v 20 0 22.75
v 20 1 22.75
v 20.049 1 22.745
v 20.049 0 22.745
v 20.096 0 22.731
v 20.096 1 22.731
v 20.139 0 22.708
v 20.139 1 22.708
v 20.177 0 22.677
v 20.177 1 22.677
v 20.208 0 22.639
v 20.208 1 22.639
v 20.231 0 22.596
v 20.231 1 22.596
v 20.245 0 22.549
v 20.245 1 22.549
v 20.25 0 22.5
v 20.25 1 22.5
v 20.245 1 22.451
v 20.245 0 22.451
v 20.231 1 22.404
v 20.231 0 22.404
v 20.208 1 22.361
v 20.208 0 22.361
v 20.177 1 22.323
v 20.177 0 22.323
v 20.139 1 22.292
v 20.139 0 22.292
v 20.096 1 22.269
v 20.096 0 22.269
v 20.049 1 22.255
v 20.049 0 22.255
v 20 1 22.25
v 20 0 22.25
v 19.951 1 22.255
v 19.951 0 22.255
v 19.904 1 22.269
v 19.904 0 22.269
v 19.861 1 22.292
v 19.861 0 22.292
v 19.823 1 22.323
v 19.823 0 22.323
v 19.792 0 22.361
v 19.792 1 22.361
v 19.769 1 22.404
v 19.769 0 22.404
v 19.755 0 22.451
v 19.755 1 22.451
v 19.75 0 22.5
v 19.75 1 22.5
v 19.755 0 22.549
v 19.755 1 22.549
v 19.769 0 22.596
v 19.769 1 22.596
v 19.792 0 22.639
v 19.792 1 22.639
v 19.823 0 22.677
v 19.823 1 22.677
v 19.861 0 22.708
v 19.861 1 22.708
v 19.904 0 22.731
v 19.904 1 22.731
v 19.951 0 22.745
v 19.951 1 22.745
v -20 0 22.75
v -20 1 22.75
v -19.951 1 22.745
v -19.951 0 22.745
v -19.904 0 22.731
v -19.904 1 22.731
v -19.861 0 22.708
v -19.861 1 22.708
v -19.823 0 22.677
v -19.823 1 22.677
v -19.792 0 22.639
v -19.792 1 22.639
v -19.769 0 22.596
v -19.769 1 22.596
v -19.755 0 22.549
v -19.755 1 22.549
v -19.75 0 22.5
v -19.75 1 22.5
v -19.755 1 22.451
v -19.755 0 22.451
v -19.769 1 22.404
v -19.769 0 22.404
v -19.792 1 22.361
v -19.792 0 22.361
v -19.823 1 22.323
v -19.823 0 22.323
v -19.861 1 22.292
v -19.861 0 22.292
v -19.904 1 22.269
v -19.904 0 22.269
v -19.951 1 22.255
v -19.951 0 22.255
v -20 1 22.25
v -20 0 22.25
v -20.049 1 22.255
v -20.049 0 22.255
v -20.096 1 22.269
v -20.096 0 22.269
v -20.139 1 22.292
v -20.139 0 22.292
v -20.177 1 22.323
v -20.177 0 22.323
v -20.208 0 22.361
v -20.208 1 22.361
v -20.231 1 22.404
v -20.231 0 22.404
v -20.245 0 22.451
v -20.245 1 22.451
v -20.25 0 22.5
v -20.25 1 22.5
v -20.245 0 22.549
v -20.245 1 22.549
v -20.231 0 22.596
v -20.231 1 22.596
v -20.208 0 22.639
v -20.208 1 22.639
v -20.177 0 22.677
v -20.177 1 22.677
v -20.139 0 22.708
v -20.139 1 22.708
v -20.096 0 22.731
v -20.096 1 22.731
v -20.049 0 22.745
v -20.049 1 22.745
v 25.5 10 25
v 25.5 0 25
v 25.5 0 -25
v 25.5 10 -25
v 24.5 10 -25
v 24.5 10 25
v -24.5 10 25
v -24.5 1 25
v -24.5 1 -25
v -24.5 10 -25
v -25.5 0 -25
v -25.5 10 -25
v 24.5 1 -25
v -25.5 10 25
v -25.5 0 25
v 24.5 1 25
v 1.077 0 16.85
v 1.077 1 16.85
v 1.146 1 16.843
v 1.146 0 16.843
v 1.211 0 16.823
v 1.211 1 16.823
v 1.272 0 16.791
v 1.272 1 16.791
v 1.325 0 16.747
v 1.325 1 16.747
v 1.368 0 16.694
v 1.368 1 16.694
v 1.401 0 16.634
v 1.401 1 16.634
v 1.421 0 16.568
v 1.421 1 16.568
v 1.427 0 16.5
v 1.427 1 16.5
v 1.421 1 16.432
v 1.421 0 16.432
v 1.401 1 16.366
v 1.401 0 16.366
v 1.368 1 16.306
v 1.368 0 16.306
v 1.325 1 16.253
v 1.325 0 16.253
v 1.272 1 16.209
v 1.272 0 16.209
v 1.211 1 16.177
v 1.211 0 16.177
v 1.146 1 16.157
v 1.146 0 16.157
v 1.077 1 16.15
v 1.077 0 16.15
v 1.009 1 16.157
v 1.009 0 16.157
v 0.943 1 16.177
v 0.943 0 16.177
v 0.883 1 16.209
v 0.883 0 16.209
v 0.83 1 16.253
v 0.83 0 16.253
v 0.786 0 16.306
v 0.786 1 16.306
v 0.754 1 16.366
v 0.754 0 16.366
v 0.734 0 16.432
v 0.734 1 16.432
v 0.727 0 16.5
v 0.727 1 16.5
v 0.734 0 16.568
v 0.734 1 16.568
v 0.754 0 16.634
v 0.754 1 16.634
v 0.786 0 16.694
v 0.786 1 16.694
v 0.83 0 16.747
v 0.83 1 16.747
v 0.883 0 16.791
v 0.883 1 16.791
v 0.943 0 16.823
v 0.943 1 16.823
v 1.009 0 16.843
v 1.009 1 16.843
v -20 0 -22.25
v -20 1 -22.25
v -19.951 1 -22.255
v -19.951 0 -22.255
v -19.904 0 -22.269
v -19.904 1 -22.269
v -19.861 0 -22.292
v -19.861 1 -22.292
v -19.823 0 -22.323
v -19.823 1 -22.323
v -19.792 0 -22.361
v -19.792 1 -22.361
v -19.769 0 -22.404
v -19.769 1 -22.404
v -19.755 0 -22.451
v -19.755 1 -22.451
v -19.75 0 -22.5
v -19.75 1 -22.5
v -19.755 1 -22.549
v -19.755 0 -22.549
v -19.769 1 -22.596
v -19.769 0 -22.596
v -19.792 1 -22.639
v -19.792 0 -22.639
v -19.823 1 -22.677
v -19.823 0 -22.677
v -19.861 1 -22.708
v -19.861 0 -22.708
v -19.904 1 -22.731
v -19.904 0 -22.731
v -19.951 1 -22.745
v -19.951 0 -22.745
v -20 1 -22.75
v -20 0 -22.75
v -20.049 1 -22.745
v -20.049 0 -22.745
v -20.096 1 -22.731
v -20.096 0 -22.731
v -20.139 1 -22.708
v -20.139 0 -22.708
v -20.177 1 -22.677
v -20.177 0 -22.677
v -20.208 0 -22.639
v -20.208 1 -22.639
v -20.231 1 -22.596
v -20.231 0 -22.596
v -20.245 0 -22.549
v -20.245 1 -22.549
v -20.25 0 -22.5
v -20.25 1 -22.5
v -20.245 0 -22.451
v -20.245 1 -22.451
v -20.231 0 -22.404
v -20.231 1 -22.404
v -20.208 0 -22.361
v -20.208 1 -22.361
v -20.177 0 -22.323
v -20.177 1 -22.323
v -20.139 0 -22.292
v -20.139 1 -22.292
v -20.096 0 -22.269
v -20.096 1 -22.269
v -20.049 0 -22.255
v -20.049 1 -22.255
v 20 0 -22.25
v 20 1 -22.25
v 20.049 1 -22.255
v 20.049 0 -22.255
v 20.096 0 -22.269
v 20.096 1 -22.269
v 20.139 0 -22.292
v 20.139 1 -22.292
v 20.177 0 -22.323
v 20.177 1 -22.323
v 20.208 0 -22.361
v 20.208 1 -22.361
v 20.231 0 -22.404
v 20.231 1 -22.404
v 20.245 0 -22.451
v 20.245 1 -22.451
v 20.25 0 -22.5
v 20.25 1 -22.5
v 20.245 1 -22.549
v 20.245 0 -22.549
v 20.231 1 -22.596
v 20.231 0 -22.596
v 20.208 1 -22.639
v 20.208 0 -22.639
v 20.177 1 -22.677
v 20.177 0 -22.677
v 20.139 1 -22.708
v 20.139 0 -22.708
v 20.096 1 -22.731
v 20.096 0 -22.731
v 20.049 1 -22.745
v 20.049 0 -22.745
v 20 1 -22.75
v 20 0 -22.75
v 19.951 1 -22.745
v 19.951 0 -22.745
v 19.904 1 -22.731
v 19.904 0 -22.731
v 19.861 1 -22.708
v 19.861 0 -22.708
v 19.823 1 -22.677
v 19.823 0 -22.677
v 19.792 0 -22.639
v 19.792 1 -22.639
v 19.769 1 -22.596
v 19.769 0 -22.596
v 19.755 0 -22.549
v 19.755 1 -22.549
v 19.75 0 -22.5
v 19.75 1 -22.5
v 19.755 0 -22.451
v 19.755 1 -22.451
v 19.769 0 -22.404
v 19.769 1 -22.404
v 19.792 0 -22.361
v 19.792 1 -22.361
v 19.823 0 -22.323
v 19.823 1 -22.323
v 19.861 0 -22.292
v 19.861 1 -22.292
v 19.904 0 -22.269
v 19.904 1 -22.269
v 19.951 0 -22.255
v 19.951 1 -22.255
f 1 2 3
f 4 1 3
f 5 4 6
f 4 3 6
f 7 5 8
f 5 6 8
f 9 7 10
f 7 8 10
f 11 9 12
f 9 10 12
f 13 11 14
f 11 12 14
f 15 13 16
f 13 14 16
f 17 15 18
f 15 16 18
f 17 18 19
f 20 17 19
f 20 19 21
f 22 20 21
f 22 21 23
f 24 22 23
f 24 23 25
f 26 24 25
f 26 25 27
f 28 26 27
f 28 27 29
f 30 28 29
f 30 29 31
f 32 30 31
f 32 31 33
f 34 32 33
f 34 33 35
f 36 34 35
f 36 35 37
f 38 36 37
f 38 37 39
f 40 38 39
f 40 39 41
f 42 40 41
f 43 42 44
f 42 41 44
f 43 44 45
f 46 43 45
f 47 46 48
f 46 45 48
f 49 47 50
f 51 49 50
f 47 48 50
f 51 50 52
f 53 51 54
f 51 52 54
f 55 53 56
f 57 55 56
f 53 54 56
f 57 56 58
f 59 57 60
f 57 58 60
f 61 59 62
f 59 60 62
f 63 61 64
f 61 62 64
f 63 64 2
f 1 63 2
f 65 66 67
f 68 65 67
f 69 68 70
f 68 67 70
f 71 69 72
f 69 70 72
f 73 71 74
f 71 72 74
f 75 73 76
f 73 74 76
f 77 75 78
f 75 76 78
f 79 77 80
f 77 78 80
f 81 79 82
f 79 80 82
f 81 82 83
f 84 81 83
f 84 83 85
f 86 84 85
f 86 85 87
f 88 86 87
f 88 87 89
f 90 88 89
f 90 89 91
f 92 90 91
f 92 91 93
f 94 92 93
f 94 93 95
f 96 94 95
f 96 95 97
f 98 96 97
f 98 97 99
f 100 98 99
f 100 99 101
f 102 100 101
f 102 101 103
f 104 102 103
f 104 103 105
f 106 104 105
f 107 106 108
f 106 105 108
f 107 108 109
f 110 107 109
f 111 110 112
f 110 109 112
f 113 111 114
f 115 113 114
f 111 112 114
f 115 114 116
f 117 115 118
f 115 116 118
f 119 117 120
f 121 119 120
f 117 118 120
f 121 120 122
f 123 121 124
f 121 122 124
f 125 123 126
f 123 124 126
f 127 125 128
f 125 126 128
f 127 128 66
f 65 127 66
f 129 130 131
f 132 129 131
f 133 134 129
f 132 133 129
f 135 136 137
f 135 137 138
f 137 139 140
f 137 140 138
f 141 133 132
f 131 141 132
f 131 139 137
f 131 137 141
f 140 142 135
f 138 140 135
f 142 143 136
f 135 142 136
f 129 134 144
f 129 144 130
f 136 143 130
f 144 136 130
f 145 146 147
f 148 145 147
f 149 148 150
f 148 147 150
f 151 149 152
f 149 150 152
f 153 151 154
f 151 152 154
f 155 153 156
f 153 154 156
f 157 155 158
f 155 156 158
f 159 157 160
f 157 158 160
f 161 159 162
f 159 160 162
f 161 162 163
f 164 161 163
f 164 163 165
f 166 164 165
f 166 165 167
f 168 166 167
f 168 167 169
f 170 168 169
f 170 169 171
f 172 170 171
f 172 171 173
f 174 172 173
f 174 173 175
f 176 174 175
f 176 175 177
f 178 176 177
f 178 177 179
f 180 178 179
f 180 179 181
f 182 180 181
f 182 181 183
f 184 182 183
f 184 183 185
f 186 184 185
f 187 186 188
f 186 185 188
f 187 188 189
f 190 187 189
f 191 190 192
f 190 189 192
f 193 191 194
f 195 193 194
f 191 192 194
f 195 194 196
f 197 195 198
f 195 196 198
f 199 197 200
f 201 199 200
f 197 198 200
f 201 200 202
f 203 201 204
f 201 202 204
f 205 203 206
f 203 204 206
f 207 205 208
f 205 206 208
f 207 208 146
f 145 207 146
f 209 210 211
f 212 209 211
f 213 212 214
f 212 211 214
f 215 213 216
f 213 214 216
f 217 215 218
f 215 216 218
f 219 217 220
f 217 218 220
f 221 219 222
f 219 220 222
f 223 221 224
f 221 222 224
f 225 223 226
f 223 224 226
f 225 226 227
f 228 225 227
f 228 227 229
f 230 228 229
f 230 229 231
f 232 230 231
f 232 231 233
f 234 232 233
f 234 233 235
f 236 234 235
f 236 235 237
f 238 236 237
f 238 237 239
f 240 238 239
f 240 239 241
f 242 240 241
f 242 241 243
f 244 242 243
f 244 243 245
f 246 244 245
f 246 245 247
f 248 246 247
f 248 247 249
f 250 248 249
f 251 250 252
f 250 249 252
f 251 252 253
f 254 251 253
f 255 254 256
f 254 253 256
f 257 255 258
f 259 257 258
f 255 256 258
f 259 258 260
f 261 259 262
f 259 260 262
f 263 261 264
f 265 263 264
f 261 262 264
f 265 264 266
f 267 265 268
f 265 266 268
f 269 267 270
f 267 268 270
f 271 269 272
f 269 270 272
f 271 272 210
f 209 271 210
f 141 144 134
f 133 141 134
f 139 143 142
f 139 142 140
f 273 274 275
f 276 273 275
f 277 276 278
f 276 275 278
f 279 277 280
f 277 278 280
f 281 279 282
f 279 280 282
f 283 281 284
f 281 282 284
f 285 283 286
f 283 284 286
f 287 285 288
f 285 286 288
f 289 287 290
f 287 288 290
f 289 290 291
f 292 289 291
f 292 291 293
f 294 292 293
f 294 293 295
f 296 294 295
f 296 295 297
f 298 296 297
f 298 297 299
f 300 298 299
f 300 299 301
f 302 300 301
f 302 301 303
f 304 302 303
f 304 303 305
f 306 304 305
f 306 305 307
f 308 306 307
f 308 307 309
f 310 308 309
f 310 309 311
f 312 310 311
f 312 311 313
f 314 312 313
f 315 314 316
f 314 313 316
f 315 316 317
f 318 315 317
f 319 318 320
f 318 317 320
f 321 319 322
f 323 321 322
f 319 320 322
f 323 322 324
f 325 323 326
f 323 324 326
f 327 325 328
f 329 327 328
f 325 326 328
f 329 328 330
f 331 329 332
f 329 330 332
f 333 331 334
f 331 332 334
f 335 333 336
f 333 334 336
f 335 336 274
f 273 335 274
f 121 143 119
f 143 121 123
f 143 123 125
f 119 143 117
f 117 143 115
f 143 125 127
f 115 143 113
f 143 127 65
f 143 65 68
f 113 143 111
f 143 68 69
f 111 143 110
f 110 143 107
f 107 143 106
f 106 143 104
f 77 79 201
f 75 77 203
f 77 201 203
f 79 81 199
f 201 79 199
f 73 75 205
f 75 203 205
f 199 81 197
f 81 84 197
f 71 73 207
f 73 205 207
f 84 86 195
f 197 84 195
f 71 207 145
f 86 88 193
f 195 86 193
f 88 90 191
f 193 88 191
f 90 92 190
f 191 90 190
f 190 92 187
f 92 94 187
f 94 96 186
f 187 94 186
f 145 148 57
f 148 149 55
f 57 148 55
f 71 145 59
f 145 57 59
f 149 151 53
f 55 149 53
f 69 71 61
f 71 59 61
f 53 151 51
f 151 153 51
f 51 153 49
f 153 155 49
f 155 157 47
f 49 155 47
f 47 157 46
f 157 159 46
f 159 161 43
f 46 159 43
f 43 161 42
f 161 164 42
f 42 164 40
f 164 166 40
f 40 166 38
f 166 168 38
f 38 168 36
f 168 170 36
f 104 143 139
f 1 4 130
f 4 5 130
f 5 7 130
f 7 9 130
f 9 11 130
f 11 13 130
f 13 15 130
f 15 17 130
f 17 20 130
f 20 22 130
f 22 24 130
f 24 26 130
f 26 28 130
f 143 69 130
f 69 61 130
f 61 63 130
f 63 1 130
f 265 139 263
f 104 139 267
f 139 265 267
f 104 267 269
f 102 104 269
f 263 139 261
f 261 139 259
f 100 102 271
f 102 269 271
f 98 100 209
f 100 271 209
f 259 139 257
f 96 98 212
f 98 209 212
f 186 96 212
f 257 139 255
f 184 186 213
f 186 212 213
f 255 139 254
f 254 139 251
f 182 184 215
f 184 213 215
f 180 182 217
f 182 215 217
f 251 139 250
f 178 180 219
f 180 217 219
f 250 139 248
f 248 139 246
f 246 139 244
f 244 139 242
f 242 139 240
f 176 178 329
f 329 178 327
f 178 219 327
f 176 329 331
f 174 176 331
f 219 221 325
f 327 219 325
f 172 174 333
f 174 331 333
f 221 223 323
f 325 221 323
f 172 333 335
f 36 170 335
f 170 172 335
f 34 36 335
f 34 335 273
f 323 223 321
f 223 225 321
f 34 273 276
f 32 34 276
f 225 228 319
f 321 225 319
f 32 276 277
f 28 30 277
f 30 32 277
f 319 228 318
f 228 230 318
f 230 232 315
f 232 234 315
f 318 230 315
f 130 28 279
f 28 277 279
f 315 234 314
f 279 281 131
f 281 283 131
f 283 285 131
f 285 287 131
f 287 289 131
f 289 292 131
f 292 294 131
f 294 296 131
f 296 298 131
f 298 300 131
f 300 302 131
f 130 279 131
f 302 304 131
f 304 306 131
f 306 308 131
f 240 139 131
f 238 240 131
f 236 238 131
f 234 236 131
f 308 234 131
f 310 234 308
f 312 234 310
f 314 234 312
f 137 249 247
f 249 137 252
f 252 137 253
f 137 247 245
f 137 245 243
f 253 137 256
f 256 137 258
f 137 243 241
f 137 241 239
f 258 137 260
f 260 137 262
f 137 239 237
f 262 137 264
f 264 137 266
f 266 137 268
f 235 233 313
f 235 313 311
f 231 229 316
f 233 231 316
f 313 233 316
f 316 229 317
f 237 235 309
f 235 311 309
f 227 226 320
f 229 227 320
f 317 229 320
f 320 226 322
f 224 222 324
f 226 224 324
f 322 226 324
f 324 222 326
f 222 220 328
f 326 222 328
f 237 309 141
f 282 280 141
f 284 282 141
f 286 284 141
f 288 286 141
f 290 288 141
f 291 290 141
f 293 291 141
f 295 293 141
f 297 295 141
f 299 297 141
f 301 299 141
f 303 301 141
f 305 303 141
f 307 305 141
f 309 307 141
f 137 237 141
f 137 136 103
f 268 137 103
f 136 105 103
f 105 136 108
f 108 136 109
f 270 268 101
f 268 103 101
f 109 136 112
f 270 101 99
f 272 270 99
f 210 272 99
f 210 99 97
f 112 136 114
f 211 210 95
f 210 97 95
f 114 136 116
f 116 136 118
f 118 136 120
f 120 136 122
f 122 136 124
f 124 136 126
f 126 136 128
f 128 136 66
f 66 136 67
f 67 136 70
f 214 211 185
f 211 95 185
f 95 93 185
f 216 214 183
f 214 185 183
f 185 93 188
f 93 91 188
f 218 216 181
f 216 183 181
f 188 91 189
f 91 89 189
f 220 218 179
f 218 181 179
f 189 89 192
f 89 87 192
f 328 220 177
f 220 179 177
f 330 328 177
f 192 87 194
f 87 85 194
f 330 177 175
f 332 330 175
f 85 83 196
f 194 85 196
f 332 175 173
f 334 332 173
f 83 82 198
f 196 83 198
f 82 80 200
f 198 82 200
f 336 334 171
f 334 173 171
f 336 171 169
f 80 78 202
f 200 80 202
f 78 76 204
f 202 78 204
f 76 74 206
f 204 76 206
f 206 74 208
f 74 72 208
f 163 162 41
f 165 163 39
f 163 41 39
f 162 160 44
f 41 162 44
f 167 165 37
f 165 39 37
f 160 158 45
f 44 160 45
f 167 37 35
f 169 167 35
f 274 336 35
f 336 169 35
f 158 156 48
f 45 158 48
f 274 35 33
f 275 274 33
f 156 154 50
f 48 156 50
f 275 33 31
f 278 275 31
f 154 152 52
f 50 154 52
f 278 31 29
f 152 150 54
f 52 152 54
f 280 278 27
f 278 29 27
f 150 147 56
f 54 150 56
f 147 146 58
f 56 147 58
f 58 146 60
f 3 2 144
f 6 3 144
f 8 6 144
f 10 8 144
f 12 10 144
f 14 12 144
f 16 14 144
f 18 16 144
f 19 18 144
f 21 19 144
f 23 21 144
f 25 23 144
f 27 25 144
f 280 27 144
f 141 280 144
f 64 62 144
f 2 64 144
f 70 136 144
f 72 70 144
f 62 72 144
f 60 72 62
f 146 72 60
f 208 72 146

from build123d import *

# Parameters (mm, degrees)
CROQUIS2_W              = 51
CROQUIS2_H              = 50
SALIENTE_EXTRUIR3_DEPTH = 10
CROQUIS6_W              = 49
CROQUIS6_H              = 9
CORTAR_EXTRUIR4_DEPTH   = 50
CORTAR_EXTRUIR5_REACH   = 38.827
CROQUIS7_R              = 0.25
CORTAR_EXTRUIR7_REACH   = 38.827
CROQUIS10_R             = 0.25
CORTAR_EXTRUIR8_REACH   = 38.827
CROQUIS11_R             = 0.25
CORTAR_EXTRUIR9_REACH   = 38.827
CROQUIS12_R             = 0.25
CORTAR_EXTRUIR10_REACH  = 38.827
CROQUIS13_R             = 0.35


with BuildPart() as part:
    # Croquis2 → Saliente-Extruir3 (new body)
    with BuildSketch(Plane(origin=(0, 0, 0), x_dir=(1, 0, 0), z_dir=(0, 1, 0))):
        Rectangle(CROQUIS2_W, CROQUIS2_H)
    extrude(amount=SALIENTE_EXTRUIR3_DEPTH)

    # Croquis6 → Cortar-Extruir4 (cut)
    with BuildSketch(Plane.XY.offset(25)):
        with Locations((0, 5.5)):
            Rectangle(CROQUIS6_W, CROQUIS6_H)
    extrude(amount=-CORTAR_EXTRUIR4_DEPTH, mode=Mode.SUBTRACT)

    # Croquis7 → Cortar-Extruir5 (cut, up to next)
    with BuildSketch(Plane(origin=(0, 1, 0), x_dir=(1, 0, 0), z_dir=(0, 1, 0)), mode=Mode.PRIVATE) as cortar_extruir5_sk1:
        with Locations(Location((-20, 22.5, 0), (0, 0, 270))):
            Circle(CROQUIS7_R)
    cortar_extruir5_tool1 = extrude(cortar_extruir5_sk1.sketch, amount=-CORTAR_EXTRUIR5_REACH, mode=Mode.PRIVATE) & part.part
    add(cortar_extruir5_tool1.solids().sort_by_distance((-20, 1, -22.5))[0], mode=Mode.SUBTRACT)

    # Croquis10 → Cortar-Extruir7 (cut, up to next)
    with BuildSketch(Plane(origin=(0, 1, 0), x_dir=(1, 0, 0), z_dir=(0, 1, 0)), mode=Mode.PRIVATE) as cortar_extruir7_sk1:
        with Locations(Location((20, 22.5, 0), (0, 0, 270))):
            Circle(CROQUIS10_R)
    cortar_extruir7_tool1 = extrude(cortar_extruir7_sk1.sketch, amount=-CORTAR_EXTRUIR7_REACH, mode=Mode.PRIVATE) & part.part
    add(cortar_extruir7_tool1.solids().sort_by_distance((20, 1, -22.5))[0], mode=Mode.SUBTRACT)

    # Croquis11 → Cortar-Extruir8 (cut, up to next)
    with BuildSketch(Plane(origin=(0, 1, 0), x_dir=(1, 0, 0), z_dir=(0, 1, 0)), mode=Mode.PRIVATE) as cortar_extruir8_sk1:
        with Locations(Location((-20, -22.5, 0), (0, 0, 270))):
            Circle(CROQUIS11_R)
    cortar_extruir8_tool1 = extrude(cortar_extruir8_sk1.sketch, amount=-CORTAR_EXTRUIR8_REACH, mode=Mode.PRIVATE) & part.part
    add(cortar_extruir8_tool1.solids().sort_by_distance((-20, 1, 22.5))[0], mode=Mode.SUBTRACT)

    # Croquis12 → Cortar-Extruir9 (cut, up to next)
    with BuildSketch(Plane(origin=(0, 1, 0), x_dir=(1, 0, 0), z_dir=(0, 1, 0)), mode=Mode.PRIVATE) as cortar_extruir9_sk1:
        with Locations(Location((20, -22.5, 0), (0, 0, 270))):
            Circle(CROQUIS12_R)
    cortar_extruir9_tool1 = extrude(cortar_extruir9_sk1.sketch, amount=-CORTAR_EXTRUIR9_REACH, mode=Mode.PRIVATE) & part.part
    add(cortar_extruir9_tool1.solids().sort_by_distance((20, 1, 22.5))[0], mode=Mode.SUBTRACT)

    # Croquis13 → Cortar-Extruir10 (cut, up to next)
    with BuildSketch(Plane(origin=(0, 1, 0), x_dir=(1, 0, 0), z_dir=(0, 1, 0)), mode=Mode.PRIVATE) as cortar_extruir10_sk1:
        with Locations(Location((1.077350269, -16.5, 0), (0, 0, 270))):
            Circle(CROQUIS13_R)
    cortar_extruir10_tool1 = extrude(cortar_extruir10_sk1.sketch, amount=-CORTAR_EXTRUIR10_REACH, mode=Mode.PRIVATE) & part.part
    add(cortar_extruir10_tool1.solids().sort_by_distance((1.07735, 1, 16.5))[0], mode=Mode.SUBTRACT)


solid = part.part
